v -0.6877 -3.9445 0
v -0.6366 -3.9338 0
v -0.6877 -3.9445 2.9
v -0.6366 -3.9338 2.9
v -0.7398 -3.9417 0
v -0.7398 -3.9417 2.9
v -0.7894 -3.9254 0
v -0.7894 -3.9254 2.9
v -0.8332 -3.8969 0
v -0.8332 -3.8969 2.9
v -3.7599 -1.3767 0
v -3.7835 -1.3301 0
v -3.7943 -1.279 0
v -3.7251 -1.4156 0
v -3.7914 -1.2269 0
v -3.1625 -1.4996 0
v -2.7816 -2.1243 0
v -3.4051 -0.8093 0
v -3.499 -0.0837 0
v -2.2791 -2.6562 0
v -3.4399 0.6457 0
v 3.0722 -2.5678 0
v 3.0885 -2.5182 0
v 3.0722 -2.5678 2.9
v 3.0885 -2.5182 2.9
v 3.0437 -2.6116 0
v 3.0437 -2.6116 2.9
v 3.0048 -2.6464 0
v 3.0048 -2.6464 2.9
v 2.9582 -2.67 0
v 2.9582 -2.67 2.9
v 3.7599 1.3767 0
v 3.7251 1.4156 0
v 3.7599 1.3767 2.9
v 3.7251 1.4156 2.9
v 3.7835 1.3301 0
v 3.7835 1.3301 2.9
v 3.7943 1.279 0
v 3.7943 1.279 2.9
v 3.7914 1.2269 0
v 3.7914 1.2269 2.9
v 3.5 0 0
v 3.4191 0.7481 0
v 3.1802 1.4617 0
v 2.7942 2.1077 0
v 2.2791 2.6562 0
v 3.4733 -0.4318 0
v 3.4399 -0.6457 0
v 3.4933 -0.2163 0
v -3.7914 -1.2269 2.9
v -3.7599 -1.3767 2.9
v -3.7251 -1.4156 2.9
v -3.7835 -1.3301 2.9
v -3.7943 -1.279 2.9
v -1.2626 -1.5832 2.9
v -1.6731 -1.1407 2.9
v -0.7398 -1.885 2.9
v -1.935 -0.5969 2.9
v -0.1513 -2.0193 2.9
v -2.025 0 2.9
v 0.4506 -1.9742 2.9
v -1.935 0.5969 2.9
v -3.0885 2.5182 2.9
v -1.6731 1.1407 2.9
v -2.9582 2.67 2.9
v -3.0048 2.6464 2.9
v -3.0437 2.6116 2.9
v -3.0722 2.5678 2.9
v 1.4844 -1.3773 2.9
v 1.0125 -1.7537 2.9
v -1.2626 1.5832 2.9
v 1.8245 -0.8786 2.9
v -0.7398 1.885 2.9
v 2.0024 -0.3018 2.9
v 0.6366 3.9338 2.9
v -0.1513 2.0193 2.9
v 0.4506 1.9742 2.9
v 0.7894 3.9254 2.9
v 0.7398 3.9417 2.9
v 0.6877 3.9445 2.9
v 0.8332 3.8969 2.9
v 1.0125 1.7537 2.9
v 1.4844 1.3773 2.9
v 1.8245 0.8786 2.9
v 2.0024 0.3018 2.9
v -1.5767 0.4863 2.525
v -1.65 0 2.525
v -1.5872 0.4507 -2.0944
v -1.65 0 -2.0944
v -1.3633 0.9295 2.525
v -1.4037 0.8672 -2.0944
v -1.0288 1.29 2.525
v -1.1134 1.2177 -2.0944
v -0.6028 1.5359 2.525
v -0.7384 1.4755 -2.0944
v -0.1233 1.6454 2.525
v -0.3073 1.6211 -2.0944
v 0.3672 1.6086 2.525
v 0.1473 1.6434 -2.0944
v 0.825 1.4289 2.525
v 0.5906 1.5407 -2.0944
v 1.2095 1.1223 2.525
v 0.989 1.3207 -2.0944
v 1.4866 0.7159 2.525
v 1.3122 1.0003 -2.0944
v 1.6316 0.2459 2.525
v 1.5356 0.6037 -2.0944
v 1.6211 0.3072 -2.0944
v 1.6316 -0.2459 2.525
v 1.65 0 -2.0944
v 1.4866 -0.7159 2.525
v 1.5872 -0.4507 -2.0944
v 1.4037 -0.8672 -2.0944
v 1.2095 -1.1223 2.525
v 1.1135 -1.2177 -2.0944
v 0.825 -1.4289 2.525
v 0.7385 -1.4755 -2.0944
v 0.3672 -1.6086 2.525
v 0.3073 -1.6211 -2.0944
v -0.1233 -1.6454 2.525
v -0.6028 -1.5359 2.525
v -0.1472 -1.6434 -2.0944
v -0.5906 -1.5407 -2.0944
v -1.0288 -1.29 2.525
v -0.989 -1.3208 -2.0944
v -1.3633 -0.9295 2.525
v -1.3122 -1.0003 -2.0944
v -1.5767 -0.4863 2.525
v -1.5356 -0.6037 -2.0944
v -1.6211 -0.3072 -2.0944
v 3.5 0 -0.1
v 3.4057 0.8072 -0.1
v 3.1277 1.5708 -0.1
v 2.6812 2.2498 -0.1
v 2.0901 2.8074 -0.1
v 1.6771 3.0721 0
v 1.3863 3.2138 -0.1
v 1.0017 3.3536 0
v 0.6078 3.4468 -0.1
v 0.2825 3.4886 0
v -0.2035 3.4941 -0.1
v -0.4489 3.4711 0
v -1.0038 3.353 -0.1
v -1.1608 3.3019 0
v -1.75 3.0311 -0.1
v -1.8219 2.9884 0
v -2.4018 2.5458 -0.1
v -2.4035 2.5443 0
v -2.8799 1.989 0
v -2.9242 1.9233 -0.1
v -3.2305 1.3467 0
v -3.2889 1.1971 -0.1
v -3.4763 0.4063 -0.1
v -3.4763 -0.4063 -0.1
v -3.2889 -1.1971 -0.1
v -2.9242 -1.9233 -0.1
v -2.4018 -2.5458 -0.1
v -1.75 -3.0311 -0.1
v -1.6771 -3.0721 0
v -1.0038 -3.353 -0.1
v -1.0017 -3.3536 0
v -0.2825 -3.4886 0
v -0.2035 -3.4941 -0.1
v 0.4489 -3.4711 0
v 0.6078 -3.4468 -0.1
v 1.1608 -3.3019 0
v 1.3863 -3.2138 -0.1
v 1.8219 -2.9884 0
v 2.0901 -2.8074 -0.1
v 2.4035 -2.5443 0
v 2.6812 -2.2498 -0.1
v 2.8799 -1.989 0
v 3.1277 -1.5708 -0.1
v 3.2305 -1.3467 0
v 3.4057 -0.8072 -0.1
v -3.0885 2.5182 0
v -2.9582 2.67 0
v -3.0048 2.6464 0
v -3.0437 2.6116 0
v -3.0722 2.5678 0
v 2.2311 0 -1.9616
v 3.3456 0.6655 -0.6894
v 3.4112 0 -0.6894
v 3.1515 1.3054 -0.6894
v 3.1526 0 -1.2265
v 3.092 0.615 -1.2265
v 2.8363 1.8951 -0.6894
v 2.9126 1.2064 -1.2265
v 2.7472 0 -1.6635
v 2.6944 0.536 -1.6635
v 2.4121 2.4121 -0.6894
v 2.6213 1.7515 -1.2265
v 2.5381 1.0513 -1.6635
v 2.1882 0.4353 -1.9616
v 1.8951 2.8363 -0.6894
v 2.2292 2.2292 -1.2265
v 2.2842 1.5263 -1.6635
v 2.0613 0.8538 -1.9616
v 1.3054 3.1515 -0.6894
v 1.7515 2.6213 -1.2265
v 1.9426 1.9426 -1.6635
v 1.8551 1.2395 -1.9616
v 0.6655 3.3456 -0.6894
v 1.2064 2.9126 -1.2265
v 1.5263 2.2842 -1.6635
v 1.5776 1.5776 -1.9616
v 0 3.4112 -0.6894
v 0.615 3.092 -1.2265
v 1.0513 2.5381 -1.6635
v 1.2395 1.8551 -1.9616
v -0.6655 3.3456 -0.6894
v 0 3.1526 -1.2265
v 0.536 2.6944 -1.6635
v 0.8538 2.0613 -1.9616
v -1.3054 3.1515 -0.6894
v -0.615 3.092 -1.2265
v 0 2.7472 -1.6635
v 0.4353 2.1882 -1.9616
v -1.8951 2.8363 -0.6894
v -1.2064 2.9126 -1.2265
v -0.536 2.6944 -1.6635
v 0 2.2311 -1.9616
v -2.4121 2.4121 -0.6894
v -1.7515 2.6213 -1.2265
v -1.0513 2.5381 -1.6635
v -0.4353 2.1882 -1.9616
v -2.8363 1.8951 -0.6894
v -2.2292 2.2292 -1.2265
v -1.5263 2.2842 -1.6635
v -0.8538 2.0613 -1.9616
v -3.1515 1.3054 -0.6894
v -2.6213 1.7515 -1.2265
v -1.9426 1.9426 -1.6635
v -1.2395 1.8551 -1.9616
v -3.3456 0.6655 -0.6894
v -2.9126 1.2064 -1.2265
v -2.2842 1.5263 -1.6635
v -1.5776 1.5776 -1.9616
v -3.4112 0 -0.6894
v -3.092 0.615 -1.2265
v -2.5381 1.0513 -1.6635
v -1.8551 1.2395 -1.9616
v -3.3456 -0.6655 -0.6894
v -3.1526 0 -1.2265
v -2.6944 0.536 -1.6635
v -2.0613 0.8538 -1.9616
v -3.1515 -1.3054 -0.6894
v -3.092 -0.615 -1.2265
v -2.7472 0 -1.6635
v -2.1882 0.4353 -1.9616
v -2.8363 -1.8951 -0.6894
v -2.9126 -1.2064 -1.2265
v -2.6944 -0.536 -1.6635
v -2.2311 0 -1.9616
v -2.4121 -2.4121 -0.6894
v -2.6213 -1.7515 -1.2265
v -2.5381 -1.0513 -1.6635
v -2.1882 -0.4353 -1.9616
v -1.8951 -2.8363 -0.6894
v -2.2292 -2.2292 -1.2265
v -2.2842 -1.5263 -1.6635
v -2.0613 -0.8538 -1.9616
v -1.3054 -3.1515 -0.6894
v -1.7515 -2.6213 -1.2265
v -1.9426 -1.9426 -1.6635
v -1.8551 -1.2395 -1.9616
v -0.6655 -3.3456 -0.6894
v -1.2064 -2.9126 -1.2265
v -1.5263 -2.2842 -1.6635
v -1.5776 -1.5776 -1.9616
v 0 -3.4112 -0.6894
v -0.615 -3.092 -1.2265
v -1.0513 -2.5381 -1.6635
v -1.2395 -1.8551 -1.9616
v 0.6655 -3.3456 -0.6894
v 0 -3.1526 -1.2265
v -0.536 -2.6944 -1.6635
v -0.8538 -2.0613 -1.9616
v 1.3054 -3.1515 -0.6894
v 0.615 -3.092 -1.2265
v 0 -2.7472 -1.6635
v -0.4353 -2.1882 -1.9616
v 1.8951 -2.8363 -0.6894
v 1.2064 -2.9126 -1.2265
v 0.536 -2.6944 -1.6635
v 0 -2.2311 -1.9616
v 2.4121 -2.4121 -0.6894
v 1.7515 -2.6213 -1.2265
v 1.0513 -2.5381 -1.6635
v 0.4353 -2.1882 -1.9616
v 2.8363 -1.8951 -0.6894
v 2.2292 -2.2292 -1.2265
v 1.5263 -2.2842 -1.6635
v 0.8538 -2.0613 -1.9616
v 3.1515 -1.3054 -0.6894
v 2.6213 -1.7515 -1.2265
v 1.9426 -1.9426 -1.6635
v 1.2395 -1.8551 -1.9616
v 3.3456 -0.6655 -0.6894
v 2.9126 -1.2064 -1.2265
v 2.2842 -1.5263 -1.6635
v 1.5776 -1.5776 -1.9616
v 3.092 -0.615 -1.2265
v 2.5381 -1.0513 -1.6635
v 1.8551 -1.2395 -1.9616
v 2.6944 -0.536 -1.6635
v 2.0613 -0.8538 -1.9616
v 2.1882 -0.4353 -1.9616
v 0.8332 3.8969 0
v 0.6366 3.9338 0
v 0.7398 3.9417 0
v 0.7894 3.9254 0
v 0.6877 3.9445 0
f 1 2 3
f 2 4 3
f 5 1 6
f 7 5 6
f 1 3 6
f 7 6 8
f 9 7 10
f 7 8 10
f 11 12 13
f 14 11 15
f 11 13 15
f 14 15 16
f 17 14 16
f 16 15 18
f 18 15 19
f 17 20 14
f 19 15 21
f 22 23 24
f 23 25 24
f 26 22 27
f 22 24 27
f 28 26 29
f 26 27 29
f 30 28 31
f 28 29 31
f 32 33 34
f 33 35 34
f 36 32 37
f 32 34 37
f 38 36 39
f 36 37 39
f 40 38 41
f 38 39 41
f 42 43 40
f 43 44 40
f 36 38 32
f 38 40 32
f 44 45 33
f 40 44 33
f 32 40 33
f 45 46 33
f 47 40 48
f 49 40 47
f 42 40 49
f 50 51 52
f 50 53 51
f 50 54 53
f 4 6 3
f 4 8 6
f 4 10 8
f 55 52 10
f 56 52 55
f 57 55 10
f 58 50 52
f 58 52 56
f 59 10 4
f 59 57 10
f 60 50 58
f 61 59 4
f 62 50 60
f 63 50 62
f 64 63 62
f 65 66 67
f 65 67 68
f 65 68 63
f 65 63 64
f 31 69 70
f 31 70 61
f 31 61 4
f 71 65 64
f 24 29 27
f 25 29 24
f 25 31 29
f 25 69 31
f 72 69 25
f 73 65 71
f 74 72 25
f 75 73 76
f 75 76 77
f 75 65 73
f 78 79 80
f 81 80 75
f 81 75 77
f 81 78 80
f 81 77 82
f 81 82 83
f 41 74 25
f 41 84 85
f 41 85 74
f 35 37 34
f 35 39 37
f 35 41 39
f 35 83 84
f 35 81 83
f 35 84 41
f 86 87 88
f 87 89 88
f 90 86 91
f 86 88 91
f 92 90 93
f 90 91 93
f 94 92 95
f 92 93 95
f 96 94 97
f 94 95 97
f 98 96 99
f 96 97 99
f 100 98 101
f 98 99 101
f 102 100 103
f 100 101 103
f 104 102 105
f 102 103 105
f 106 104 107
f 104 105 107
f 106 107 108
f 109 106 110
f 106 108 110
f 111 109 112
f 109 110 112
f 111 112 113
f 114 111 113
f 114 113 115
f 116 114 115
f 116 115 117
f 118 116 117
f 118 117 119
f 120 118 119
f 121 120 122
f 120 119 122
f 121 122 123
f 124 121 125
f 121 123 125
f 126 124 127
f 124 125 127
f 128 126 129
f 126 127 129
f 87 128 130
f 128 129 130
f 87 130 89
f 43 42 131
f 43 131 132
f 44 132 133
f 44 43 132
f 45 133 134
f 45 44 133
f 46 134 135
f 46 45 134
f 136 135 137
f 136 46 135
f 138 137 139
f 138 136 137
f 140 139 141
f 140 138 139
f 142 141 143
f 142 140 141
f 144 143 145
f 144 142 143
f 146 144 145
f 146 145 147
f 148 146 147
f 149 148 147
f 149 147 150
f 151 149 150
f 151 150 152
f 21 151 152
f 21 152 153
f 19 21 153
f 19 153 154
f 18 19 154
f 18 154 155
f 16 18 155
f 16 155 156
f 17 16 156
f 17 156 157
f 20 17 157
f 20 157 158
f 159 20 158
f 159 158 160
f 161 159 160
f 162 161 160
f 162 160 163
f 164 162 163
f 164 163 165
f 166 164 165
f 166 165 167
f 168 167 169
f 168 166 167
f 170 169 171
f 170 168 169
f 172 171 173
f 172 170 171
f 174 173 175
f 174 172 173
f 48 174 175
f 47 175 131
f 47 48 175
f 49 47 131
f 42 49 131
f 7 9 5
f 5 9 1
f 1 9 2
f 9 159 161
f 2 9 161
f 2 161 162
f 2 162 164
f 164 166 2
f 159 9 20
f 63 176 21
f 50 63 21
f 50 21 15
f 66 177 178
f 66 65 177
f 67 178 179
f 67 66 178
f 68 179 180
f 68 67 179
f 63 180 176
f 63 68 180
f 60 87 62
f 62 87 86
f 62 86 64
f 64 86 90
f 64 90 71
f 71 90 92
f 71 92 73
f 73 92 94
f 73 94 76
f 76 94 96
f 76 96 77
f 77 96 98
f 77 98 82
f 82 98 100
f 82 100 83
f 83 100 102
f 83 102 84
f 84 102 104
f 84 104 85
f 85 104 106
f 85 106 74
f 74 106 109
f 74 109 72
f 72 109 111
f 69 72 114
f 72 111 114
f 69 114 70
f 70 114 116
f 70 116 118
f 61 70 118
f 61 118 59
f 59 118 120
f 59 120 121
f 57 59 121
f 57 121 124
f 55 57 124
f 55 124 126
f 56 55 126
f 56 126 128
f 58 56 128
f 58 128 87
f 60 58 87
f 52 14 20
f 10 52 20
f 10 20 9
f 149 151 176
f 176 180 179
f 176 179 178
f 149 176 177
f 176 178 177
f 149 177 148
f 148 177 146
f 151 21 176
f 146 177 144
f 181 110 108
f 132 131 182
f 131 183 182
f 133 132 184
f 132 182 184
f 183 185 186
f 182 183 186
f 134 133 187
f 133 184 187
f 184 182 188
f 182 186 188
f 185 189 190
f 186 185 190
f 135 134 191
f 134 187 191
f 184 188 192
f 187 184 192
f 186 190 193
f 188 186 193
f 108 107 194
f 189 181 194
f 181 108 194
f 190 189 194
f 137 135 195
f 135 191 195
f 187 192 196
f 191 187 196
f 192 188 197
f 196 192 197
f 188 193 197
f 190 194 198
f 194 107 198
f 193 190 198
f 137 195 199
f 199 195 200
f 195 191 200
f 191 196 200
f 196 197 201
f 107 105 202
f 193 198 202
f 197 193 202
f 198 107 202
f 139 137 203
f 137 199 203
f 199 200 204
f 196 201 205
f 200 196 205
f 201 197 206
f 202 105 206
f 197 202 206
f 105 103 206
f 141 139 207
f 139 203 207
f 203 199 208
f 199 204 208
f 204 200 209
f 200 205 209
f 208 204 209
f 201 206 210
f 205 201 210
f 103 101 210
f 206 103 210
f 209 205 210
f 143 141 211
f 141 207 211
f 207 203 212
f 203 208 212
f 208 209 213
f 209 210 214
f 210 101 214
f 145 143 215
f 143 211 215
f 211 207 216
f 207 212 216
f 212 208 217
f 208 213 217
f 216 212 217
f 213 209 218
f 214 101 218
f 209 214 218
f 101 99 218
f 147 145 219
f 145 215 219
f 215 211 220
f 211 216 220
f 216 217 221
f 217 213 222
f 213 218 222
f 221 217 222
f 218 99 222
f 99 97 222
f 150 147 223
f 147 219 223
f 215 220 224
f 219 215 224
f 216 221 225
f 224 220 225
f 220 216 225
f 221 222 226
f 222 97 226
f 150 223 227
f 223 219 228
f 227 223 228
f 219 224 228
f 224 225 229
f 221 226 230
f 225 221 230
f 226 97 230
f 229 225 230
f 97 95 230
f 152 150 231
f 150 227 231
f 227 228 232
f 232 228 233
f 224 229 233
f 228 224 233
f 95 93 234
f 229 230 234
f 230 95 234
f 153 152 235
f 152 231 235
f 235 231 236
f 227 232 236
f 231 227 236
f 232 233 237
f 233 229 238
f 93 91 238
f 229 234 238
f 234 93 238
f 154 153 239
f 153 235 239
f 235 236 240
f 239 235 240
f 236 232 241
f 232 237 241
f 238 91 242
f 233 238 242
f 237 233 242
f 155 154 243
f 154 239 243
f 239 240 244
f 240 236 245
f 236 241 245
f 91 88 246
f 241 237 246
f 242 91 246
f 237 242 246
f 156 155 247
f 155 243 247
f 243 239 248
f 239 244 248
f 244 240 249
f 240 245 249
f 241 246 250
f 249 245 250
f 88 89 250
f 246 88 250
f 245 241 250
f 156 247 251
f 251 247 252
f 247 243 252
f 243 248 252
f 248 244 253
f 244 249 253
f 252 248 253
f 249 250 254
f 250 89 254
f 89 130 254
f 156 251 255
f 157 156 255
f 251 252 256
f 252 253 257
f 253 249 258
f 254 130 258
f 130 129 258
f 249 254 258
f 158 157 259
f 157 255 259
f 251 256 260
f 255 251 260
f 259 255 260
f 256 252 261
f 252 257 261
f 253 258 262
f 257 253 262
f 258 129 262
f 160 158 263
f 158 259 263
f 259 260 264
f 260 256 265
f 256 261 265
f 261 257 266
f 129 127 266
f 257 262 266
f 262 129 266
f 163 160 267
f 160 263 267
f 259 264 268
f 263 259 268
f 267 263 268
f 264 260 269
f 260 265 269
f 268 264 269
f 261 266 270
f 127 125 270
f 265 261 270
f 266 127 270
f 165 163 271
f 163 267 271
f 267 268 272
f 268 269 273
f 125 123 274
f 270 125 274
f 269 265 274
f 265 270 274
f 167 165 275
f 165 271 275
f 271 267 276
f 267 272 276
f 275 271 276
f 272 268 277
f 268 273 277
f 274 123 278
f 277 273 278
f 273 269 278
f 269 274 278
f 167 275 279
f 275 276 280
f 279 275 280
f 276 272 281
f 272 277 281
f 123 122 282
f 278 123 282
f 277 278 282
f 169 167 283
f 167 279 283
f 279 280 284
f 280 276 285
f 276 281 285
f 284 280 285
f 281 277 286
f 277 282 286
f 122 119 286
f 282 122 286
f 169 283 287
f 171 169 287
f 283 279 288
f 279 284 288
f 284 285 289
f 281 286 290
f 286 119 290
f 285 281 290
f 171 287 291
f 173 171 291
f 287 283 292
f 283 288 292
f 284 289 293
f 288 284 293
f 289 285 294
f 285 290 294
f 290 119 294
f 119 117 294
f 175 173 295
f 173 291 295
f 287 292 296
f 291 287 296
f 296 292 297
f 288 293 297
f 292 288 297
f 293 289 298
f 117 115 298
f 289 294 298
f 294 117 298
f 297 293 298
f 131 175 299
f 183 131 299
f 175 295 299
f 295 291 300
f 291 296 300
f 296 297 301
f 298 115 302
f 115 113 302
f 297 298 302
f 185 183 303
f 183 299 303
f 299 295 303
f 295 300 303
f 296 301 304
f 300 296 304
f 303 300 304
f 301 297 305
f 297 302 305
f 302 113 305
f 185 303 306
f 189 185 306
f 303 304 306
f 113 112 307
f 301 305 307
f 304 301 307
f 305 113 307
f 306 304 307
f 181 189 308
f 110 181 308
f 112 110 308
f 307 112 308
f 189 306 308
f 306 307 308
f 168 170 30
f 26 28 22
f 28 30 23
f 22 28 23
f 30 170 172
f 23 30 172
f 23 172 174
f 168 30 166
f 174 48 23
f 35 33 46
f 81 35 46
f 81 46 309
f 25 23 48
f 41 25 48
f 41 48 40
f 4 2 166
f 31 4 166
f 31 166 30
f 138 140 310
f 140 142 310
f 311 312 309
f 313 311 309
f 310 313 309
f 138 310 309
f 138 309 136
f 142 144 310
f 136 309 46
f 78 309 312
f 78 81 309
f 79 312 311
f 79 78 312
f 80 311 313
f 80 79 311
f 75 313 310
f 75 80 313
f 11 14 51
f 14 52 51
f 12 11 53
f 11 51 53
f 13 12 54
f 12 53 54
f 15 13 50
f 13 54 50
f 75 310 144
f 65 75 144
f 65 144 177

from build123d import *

# Parameters (mm, degrees)
EXTRUDE_1_DEPTH              = 2.9
SKETCH_2_R                   = 3.5
EXTRUDE_3_DEPTH              = 5
FILLET_1_R                   = 2
FILLET_2_R                   = 0.2
HOLE_WIZARD_M4_2_D           = 3.3
HOLE_WIZARD_M4_2_DEPTH       = 10.1
HOLE_WIZARD_M4_2_CSINK_D     = 4.05
HOLE_WIZARD_M4_2_CSINK_ANGLE = 90
HOLE_WIZARD_M4_2_TIP         = 0.991420021


with BuildPart() as part:
    # 草图1 → 凸台-拉伸1 (new body)
    with BuildSketch(Plane.XY):
        Polygon((3.067162176, -2.631700879), (3.812700905, 1.340389922), (0.745538729, 3.972090802), (-3.067162176, 2.631700879), (-3.812700905, -1.340389922), (-0.745538729, -3.972090802), align=None)
    extrude(amount=EXTRUDE_1_DEPTH)

    # 草图2 → 凸台-拉伸3 (add)
    with BuildSketch(Plane.XY.offset(2.9)):
        Circle(SKETCH_2_R)
    extrude(amount=-EXTRUDE_3_DEPTH)

    # 圆角1
    fillet_1_edges = [part.edges().sort_by_distance(p)[0] for p in [
        (-3.5, 0, -2.1),
    ]]
    fillet(fillet_1_edges, radius=FILLET_1_R)

    # 圆角2
    fillet_2_edges = [part.edges().sort_by_distance(p)[0] for p in [
        (-0.745538729, -3.972090802, 1.45),
        (-3.812700905, -1.340389922, 1.45),
        (-3.067162176, 2.631700879, 1.45),
        (0.745538729, 3.972090802, 1.45),
        (3.812700905, 1.340389922, 1.45),
        (3.067162176, -2.631700879, 1.45),
    ]]
    fillet(fillet_2_edges, radius=FILLET_2_R)

    # M4 螺纹孔2
    with Locations(Plane.XY.offset(2.9)):
        with Locations((0, 0)):
            CounterSinkHole(HOLE_WIZARD_M4_2_D / 2, HOLE_WIZARD_M4_2_CSINK_D / 2, depth=HOLE_WIZARD_M4_2_DEPTH, counter_sink_angle=HOLE_WIZARD_M4_2_CSINK_ANGLE)
            with Locations((0, 0, -(HOLE_WIZARD_M4_2_DEPTH + HOLE_WIZARD_M4_2_TIP / 2))):  # 118° drill point
                Cone(0, HOLE_WIZARD_M4_2_D / 2, HOLE_WIZARD_M4_2_TIP, mode=Mode.SUBTRACT)


solid = part.part
